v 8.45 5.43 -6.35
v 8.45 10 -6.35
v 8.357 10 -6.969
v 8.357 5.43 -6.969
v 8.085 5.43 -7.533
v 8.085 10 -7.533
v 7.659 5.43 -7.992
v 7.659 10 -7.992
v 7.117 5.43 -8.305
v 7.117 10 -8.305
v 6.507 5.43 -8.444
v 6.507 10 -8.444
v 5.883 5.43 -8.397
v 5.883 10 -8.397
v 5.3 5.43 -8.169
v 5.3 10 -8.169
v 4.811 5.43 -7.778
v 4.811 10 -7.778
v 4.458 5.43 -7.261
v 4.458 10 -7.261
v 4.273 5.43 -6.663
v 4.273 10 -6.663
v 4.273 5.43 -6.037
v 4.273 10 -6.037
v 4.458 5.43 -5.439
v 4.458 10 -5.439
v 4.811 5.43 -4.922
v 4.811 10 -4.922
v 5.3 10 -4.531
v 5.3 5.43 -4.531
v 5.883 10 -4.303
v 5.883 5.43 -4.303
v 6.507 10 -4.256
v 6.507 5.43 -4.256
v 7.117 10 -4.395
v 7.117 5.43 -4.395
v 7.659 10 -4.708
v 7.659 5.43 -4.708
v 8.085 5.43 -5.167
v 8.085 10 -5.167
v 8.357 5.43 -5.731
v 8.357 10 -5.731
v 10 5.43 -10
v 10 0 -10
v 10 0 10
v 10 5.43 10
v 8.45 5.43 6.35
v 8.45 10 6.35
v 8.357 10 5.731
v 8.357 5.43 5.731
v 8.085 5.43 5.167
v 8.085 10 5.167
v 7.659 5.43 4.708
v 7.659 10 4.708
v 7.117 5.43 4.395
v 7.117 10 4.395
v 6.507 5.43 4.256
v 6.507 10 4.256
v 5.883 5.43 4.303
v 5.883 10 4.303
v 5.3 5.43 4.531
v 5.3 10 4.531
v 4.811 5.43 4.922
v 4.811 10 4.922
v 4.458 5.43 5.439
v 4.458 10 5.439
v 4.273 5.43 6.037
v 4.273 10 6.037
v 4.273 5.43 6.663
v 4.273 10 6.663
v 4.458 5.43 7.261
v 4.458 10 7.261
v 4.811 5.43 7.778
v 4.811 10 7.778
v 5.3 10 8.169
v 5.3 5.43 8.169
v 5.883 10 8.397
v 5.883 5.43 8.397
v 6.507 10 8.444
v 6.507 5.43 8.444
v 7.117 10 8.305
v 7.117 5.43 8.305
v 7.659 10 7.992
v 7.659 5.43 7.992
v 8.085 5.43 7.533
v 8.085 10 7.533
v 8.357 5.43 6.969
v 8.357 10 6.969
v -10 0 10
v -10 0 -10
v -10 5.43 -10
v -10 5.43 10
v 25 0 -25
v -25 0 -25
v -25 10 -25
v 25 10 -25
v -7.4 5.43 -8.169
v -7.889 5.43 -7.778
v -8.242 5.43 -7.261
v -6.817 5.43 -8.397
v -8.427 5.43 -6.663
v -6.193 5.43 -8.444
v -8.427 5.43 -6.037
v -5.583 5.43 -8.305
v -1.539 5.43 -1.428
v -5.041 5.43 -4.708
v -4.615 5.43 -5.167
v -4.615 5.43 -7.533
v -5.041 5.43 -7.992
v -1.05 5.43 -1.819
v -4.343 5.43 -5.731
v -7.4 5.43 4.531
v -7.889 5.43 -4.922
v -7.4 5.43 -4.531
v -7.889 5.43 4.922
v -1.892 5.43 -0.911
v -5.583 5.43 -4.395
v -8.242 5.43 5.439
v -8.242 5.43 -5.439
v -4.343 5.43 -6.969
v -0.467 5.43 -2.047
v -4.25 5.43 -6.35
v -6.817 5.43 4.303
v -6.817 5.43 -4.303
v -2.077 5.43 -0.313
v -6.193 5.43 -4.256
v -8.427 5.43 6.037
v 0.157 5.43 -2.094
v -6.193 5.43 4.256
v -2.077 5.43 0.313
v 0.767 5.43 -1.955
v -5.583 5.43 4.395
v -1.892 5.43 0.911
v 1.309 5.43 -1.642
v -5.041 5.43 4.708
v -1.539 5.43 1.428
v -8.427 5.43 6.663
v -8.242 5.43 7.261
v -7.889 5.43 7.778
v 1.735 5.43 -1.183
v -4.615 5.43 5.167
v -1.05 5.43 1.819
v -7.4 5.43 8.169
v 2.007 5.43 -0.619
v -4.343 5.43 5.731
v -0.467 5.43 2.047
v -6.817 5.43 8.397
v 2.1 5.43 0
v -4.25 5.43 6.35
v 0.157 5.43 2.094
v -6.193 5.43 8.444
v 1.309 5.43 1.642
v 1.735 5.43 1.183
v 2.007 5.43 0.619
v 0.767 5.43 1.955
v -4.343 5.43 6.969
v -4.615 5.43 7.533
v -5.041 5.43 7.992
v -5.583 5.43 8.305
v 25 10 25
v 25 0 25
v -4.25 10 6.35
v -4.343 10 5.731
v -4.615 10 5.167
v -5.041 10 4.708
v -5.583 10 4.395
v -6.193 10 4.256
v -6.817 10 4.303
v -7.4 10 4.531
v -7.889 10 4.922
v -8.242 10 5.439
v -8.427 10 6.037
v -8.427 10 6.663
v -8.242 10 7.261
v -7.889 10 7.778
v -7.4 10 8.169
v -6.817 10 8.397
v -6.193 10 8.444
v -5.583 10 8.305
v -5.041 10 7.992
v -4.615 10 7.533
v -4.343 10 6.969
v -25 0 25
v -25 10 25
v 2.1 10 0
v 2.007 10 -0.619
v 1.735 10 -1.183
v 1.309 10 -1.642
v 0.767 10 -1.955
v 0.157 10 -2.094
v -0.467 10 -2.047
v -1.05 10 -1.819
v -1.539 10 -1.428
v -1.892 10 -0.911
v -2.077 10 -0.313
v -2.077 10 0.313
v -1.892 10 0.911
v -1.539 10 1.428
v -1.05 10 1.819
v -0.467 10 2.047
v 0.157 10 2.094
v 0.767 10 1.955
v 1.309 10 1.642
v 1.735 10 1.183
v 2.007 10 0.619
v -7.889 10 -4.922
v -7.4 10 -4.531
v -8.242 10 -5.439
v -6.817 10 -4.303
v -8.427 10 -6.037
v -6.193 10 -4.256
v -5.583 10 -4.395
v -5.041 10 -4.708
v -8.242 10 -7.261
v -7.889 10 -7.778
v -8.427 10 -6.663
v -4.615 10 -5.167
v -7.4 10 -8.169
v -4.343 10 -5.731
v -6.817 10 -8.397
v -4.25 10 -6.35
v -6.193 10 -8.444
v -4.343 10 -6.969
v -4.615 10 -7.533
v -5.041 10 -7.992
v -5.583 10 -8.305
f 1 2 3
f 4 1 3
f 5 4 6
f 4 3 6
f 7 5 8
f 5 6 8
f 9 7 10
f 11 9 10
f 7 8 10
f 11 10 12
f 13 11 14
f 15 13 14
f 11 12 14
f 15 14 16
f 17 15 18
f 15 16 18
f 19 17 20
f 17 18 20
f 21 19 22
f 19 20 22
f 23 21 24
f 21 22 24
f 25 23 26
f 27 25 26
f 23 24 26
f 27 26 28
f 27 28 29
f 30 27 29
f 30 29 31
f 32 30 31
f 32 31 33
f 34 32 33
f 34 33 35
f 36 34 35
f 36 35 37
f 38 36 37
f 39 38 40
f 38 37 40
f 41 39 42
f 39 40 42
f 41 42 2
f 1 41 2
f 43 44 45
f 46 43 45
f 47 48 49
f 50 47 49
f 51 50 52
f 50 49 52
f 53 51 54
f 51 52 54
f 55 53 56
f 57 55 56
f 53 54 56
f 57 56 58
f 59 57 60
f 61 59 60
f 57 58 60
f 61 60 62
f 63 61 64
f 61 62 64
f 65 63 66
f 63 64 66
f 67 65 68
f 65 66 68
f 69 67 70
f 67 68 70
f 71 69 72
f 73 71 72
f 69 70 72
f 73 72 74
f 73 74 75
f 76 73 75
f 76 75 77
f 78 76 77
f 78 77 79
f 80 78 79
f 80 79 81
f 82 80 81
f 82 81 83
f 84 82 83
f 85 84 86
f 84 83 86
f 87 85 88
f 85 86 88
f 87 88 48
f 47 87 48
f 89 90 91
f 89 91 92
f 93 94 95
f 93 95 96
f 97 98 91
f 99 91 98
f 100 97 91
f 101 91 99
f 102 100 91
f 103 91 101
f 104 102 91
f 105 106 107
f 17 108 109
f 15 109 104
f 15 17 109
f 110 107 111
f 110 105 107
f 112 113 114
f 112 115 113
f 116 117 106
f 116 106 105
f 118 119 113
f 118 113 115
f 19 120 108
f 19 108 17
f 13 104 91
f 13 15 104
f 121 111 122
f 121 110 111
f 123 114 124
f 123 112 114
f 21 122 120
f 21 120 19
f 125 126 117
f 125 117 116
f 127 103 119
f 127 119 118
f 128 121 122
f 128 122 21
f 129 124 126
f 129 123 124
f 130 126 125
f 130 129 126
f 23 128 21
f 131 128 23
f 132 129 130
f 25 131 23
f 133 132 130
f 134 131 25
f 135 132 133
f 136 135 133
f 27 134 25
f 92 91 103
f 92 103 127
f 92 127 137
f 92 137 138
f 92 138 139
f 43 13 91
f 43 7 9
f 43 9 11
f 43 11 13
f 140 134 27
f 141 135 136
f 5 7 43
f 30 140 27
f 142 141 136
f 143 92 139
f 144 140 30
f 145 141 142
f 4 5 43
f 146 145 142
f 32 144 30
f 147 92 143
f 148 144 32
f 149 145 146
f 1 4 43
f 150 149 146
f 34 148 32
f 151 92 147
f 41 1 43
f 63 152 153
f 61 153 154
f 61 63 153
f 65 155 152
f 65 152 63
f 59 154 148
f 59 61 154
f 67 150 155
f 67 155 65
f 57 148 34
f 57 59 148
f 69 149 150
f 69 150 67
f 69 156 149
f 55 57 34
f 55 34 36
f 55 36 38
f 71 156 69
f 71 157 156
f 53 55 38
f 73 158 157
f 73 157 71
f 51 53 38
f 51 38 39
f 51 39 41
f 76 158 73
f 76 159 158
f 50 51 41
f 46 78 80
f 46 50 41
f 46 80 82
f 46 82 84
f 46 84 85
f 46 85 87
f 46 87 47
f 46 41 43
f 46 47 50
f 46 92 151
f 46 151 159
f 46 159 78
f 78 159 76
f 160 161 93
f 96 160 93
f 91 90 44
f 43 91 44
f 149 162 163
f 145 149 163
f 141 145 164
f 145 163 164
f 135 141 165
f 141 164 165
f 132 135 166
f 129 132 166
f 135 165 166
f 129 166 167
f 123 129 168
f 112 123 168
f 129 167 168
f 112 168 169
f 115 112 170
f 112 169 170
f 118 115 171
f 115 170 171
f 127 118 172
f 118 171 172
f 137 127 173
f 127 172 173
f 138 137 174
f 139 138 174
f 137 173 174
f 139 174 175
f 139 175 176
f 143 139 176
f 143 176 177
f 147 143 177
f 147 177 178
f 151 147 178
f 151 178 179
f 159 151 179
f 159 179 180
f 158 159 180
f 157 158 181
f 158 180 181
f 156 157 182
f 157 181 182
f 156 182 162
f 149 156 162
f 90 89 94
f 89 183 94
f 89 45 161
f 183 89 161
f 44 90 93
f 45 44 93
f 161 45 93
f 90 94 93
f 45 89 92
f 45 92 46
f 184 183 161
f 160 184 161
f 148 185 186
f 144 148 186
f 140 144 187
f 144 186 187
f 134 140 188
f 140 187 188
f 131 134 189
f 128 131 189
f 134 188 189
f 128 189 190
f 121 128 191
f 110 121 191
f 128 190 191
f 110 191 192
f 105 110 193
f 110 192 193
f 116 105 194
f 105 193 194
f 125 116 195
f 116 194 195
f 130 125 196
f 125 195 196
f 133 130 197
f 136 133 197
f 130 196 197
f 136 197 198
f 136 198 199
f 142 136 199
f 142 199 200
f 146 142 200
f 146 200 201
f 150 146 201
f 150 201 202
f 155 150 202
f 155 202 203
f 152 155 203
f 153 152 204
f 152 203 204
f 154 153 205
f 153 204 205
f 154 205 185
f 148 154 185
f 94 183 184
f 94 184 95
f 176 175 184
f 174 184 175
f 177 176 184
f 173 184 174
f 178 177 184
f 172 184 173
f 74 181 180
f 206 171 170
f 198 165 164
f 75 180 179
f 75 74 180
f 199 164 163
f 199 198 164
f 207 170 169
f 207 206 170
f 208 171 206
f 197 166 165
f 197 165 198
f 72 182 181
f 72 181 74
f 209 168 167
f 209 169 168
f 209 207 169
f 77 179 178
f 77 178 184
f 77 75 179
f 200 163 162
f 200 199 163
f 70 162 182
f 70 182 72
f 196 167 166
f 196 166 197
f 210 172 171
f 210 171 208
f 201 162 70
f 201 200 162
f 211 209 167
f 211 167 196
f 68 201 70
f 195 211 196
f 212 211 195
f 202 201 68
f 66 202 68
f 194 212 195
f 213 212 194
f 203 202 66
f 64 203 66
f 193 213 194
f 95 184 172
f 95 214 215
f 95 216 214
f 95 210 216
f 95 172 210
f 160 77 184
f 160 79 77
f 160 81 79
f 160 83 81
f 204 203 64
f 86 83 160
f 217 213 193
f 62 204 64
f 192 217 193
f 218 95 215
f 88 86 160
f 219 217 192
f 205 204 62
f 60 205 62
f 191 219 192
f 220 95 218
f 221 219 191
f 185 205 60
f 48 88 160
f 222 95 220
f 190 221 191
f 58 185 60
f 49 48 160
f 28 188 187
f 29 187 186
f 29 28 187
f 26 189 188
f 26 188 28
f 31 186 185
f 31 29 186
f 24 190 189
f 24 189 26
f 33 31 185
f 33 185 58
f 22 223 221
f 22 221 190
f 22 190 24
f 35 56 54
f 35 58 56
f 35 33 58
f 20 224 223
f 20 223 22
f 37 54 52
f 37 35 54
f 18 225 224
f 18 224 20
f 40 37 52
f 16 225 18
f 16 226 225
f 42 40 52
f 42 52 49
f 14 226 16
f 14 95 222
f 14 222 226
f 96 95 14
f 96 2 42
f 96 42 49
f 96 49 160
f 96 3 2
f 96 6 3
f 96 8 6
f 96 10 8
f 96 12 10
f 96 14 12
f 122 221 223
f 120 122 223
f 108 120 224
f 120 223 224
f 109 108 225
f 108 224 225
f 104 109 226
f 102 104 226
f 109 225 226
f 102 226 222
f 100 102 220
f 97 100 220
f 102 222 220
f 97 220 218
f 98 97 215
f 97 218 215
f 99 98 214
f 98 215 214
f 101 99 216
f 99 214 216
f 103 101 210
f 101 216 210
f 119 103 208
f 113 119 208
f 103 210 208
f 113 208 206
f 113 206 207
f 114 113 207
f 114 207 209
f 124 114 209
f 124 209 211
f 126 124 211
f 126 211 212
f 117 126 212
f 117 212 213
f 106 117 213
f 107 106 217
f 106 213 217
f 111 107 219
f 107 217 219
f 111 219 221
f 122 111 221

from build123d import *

# Parameters (mm, degrees)
SKETCH2_W           = 50
SKETCH2_H           = 50
BOSS_EXTRUDE1_DEPTH = 10
SKETCH4_R           = 2.1
CUT_EXTRUDE1_DEPTH  = 4.57
SKETCH5_W           = 20
SKETCH5_H           = 20
CUT_EXTRUDE2_DEPTH  = 5.43


with BuildPart() as part:
    # Sketch2 → Boss-Extrude1 (new body)
    with BuildSketch(Plane(origin=(0, 0, 0), x_dir=(1, 0, 0), z_dir=(0, 1, 0))):
        Rectangle(SKETCH2_W, SKETCH2_H)
    extrude(amount=BOSS_EXTRUDE1_DEPTH)

    # Sketch4 → Cut-Extrude1 (cut)
    with BuildSketch(Plane(origin=(0, 10, 0), x_dir=(1, 0, 0), z_dir=(0, 1, 0))):
        Circle(SKETCH4_R)
        with Locations((6.35, 6.35)):
            Circle(SKETCH4_R)
        with Locations((-6.35, 6.35)):
            Circle(SKETCH4_R)
        with Locations((-6.35, -6.35)):
            Circle(SKETCH4_R)
        with Locations((6.35, -6.35)):
            Circle(SKETCH4_R)
    extrude(amount=-CUT_EXTRUDE1_DEPTH, mode=Mode.SUBTRACT)

    # Sketch5 → Cut-Extrude2 (cut)
    with BuildSketch(Plane.XZ):
        Rectangle(SKETCH5_W, SKETCH5_H)
    extrude(amount=-CUT_EXTRUDE2_DEPTH, mode=Mode.SUBTRACT)


solid = part.part
